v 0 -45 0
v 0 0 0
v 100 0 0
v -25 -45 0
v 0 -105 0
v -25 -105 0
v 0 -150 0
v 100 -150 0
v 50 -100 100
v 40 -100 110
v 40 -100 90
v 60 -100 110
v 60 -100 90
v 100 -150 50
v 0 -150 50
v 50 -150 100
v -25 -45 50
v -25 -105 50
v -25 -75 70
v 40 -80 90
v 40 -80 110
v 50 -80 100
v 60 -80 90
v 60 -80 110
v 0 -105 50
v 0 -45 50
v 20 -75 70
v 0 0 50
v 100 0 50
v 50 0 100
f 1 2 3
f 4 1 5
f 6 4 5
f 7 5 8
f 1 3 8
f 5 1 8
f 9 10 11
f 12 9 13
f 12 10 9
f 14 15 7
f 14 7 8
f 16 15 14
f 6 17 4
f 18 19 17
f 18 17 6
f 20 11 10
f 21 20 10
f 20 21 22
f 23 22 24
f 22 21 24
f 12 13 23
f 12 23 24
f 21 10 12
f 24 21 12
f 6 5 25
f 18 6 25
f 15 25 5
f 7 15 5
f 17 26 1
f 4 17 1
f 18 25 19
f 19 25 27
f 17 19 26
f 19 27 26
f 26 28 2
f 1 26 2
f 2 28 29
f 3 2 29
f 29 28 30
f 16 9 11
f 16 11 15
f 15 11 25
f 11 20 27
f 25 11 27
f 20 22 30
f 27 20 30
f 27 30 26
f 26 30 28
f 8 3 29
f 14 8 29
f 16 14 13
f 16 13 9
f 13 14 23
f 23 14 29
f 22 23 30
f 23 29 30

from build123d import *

# Parameters (mm, degrees)
F1_DEPTH      = 150
F3_DEPTH      = 25
F3_DEPTH_BACK = 25
F5_W          = 20
F5_H          = 20
F6_DEPTH      = 20


with BuildPart() as f1:
    # F0 (on Front) → F1 (new body)
    with BuildSketch(Plane.XZ):
        Polygon((0, 50), (0, 0), (100, 0), (100, 50), (50, 100), align=None)
    extrude(amount=F1_DEPTH)

    # F2 (on face) → F3 (join, two sides)
    with BuildSketch(Plane(origin=(0, 0, 0), x_dir=(0, -1, 0), z_dir=(-1, 0, 0))) as f3_sk:
        Polygon((45, 50), (45, 0), (105, 0), (105, 50), (75, 70), align=None)
    extrude(amount=F3_DEPTH)
    extrude(f3_sk.sketch, amount=-F3_DEPTH_BACK)

    # F5 (on offset) → F6 (join)
    with BuildSketch(Plane.XZ.offset(100)):
        with Locations((50, 100)):
            Rectangle(F5_W, F5_H)
    extrude(amount=-F6_DEPTH)


solid = f1.part
